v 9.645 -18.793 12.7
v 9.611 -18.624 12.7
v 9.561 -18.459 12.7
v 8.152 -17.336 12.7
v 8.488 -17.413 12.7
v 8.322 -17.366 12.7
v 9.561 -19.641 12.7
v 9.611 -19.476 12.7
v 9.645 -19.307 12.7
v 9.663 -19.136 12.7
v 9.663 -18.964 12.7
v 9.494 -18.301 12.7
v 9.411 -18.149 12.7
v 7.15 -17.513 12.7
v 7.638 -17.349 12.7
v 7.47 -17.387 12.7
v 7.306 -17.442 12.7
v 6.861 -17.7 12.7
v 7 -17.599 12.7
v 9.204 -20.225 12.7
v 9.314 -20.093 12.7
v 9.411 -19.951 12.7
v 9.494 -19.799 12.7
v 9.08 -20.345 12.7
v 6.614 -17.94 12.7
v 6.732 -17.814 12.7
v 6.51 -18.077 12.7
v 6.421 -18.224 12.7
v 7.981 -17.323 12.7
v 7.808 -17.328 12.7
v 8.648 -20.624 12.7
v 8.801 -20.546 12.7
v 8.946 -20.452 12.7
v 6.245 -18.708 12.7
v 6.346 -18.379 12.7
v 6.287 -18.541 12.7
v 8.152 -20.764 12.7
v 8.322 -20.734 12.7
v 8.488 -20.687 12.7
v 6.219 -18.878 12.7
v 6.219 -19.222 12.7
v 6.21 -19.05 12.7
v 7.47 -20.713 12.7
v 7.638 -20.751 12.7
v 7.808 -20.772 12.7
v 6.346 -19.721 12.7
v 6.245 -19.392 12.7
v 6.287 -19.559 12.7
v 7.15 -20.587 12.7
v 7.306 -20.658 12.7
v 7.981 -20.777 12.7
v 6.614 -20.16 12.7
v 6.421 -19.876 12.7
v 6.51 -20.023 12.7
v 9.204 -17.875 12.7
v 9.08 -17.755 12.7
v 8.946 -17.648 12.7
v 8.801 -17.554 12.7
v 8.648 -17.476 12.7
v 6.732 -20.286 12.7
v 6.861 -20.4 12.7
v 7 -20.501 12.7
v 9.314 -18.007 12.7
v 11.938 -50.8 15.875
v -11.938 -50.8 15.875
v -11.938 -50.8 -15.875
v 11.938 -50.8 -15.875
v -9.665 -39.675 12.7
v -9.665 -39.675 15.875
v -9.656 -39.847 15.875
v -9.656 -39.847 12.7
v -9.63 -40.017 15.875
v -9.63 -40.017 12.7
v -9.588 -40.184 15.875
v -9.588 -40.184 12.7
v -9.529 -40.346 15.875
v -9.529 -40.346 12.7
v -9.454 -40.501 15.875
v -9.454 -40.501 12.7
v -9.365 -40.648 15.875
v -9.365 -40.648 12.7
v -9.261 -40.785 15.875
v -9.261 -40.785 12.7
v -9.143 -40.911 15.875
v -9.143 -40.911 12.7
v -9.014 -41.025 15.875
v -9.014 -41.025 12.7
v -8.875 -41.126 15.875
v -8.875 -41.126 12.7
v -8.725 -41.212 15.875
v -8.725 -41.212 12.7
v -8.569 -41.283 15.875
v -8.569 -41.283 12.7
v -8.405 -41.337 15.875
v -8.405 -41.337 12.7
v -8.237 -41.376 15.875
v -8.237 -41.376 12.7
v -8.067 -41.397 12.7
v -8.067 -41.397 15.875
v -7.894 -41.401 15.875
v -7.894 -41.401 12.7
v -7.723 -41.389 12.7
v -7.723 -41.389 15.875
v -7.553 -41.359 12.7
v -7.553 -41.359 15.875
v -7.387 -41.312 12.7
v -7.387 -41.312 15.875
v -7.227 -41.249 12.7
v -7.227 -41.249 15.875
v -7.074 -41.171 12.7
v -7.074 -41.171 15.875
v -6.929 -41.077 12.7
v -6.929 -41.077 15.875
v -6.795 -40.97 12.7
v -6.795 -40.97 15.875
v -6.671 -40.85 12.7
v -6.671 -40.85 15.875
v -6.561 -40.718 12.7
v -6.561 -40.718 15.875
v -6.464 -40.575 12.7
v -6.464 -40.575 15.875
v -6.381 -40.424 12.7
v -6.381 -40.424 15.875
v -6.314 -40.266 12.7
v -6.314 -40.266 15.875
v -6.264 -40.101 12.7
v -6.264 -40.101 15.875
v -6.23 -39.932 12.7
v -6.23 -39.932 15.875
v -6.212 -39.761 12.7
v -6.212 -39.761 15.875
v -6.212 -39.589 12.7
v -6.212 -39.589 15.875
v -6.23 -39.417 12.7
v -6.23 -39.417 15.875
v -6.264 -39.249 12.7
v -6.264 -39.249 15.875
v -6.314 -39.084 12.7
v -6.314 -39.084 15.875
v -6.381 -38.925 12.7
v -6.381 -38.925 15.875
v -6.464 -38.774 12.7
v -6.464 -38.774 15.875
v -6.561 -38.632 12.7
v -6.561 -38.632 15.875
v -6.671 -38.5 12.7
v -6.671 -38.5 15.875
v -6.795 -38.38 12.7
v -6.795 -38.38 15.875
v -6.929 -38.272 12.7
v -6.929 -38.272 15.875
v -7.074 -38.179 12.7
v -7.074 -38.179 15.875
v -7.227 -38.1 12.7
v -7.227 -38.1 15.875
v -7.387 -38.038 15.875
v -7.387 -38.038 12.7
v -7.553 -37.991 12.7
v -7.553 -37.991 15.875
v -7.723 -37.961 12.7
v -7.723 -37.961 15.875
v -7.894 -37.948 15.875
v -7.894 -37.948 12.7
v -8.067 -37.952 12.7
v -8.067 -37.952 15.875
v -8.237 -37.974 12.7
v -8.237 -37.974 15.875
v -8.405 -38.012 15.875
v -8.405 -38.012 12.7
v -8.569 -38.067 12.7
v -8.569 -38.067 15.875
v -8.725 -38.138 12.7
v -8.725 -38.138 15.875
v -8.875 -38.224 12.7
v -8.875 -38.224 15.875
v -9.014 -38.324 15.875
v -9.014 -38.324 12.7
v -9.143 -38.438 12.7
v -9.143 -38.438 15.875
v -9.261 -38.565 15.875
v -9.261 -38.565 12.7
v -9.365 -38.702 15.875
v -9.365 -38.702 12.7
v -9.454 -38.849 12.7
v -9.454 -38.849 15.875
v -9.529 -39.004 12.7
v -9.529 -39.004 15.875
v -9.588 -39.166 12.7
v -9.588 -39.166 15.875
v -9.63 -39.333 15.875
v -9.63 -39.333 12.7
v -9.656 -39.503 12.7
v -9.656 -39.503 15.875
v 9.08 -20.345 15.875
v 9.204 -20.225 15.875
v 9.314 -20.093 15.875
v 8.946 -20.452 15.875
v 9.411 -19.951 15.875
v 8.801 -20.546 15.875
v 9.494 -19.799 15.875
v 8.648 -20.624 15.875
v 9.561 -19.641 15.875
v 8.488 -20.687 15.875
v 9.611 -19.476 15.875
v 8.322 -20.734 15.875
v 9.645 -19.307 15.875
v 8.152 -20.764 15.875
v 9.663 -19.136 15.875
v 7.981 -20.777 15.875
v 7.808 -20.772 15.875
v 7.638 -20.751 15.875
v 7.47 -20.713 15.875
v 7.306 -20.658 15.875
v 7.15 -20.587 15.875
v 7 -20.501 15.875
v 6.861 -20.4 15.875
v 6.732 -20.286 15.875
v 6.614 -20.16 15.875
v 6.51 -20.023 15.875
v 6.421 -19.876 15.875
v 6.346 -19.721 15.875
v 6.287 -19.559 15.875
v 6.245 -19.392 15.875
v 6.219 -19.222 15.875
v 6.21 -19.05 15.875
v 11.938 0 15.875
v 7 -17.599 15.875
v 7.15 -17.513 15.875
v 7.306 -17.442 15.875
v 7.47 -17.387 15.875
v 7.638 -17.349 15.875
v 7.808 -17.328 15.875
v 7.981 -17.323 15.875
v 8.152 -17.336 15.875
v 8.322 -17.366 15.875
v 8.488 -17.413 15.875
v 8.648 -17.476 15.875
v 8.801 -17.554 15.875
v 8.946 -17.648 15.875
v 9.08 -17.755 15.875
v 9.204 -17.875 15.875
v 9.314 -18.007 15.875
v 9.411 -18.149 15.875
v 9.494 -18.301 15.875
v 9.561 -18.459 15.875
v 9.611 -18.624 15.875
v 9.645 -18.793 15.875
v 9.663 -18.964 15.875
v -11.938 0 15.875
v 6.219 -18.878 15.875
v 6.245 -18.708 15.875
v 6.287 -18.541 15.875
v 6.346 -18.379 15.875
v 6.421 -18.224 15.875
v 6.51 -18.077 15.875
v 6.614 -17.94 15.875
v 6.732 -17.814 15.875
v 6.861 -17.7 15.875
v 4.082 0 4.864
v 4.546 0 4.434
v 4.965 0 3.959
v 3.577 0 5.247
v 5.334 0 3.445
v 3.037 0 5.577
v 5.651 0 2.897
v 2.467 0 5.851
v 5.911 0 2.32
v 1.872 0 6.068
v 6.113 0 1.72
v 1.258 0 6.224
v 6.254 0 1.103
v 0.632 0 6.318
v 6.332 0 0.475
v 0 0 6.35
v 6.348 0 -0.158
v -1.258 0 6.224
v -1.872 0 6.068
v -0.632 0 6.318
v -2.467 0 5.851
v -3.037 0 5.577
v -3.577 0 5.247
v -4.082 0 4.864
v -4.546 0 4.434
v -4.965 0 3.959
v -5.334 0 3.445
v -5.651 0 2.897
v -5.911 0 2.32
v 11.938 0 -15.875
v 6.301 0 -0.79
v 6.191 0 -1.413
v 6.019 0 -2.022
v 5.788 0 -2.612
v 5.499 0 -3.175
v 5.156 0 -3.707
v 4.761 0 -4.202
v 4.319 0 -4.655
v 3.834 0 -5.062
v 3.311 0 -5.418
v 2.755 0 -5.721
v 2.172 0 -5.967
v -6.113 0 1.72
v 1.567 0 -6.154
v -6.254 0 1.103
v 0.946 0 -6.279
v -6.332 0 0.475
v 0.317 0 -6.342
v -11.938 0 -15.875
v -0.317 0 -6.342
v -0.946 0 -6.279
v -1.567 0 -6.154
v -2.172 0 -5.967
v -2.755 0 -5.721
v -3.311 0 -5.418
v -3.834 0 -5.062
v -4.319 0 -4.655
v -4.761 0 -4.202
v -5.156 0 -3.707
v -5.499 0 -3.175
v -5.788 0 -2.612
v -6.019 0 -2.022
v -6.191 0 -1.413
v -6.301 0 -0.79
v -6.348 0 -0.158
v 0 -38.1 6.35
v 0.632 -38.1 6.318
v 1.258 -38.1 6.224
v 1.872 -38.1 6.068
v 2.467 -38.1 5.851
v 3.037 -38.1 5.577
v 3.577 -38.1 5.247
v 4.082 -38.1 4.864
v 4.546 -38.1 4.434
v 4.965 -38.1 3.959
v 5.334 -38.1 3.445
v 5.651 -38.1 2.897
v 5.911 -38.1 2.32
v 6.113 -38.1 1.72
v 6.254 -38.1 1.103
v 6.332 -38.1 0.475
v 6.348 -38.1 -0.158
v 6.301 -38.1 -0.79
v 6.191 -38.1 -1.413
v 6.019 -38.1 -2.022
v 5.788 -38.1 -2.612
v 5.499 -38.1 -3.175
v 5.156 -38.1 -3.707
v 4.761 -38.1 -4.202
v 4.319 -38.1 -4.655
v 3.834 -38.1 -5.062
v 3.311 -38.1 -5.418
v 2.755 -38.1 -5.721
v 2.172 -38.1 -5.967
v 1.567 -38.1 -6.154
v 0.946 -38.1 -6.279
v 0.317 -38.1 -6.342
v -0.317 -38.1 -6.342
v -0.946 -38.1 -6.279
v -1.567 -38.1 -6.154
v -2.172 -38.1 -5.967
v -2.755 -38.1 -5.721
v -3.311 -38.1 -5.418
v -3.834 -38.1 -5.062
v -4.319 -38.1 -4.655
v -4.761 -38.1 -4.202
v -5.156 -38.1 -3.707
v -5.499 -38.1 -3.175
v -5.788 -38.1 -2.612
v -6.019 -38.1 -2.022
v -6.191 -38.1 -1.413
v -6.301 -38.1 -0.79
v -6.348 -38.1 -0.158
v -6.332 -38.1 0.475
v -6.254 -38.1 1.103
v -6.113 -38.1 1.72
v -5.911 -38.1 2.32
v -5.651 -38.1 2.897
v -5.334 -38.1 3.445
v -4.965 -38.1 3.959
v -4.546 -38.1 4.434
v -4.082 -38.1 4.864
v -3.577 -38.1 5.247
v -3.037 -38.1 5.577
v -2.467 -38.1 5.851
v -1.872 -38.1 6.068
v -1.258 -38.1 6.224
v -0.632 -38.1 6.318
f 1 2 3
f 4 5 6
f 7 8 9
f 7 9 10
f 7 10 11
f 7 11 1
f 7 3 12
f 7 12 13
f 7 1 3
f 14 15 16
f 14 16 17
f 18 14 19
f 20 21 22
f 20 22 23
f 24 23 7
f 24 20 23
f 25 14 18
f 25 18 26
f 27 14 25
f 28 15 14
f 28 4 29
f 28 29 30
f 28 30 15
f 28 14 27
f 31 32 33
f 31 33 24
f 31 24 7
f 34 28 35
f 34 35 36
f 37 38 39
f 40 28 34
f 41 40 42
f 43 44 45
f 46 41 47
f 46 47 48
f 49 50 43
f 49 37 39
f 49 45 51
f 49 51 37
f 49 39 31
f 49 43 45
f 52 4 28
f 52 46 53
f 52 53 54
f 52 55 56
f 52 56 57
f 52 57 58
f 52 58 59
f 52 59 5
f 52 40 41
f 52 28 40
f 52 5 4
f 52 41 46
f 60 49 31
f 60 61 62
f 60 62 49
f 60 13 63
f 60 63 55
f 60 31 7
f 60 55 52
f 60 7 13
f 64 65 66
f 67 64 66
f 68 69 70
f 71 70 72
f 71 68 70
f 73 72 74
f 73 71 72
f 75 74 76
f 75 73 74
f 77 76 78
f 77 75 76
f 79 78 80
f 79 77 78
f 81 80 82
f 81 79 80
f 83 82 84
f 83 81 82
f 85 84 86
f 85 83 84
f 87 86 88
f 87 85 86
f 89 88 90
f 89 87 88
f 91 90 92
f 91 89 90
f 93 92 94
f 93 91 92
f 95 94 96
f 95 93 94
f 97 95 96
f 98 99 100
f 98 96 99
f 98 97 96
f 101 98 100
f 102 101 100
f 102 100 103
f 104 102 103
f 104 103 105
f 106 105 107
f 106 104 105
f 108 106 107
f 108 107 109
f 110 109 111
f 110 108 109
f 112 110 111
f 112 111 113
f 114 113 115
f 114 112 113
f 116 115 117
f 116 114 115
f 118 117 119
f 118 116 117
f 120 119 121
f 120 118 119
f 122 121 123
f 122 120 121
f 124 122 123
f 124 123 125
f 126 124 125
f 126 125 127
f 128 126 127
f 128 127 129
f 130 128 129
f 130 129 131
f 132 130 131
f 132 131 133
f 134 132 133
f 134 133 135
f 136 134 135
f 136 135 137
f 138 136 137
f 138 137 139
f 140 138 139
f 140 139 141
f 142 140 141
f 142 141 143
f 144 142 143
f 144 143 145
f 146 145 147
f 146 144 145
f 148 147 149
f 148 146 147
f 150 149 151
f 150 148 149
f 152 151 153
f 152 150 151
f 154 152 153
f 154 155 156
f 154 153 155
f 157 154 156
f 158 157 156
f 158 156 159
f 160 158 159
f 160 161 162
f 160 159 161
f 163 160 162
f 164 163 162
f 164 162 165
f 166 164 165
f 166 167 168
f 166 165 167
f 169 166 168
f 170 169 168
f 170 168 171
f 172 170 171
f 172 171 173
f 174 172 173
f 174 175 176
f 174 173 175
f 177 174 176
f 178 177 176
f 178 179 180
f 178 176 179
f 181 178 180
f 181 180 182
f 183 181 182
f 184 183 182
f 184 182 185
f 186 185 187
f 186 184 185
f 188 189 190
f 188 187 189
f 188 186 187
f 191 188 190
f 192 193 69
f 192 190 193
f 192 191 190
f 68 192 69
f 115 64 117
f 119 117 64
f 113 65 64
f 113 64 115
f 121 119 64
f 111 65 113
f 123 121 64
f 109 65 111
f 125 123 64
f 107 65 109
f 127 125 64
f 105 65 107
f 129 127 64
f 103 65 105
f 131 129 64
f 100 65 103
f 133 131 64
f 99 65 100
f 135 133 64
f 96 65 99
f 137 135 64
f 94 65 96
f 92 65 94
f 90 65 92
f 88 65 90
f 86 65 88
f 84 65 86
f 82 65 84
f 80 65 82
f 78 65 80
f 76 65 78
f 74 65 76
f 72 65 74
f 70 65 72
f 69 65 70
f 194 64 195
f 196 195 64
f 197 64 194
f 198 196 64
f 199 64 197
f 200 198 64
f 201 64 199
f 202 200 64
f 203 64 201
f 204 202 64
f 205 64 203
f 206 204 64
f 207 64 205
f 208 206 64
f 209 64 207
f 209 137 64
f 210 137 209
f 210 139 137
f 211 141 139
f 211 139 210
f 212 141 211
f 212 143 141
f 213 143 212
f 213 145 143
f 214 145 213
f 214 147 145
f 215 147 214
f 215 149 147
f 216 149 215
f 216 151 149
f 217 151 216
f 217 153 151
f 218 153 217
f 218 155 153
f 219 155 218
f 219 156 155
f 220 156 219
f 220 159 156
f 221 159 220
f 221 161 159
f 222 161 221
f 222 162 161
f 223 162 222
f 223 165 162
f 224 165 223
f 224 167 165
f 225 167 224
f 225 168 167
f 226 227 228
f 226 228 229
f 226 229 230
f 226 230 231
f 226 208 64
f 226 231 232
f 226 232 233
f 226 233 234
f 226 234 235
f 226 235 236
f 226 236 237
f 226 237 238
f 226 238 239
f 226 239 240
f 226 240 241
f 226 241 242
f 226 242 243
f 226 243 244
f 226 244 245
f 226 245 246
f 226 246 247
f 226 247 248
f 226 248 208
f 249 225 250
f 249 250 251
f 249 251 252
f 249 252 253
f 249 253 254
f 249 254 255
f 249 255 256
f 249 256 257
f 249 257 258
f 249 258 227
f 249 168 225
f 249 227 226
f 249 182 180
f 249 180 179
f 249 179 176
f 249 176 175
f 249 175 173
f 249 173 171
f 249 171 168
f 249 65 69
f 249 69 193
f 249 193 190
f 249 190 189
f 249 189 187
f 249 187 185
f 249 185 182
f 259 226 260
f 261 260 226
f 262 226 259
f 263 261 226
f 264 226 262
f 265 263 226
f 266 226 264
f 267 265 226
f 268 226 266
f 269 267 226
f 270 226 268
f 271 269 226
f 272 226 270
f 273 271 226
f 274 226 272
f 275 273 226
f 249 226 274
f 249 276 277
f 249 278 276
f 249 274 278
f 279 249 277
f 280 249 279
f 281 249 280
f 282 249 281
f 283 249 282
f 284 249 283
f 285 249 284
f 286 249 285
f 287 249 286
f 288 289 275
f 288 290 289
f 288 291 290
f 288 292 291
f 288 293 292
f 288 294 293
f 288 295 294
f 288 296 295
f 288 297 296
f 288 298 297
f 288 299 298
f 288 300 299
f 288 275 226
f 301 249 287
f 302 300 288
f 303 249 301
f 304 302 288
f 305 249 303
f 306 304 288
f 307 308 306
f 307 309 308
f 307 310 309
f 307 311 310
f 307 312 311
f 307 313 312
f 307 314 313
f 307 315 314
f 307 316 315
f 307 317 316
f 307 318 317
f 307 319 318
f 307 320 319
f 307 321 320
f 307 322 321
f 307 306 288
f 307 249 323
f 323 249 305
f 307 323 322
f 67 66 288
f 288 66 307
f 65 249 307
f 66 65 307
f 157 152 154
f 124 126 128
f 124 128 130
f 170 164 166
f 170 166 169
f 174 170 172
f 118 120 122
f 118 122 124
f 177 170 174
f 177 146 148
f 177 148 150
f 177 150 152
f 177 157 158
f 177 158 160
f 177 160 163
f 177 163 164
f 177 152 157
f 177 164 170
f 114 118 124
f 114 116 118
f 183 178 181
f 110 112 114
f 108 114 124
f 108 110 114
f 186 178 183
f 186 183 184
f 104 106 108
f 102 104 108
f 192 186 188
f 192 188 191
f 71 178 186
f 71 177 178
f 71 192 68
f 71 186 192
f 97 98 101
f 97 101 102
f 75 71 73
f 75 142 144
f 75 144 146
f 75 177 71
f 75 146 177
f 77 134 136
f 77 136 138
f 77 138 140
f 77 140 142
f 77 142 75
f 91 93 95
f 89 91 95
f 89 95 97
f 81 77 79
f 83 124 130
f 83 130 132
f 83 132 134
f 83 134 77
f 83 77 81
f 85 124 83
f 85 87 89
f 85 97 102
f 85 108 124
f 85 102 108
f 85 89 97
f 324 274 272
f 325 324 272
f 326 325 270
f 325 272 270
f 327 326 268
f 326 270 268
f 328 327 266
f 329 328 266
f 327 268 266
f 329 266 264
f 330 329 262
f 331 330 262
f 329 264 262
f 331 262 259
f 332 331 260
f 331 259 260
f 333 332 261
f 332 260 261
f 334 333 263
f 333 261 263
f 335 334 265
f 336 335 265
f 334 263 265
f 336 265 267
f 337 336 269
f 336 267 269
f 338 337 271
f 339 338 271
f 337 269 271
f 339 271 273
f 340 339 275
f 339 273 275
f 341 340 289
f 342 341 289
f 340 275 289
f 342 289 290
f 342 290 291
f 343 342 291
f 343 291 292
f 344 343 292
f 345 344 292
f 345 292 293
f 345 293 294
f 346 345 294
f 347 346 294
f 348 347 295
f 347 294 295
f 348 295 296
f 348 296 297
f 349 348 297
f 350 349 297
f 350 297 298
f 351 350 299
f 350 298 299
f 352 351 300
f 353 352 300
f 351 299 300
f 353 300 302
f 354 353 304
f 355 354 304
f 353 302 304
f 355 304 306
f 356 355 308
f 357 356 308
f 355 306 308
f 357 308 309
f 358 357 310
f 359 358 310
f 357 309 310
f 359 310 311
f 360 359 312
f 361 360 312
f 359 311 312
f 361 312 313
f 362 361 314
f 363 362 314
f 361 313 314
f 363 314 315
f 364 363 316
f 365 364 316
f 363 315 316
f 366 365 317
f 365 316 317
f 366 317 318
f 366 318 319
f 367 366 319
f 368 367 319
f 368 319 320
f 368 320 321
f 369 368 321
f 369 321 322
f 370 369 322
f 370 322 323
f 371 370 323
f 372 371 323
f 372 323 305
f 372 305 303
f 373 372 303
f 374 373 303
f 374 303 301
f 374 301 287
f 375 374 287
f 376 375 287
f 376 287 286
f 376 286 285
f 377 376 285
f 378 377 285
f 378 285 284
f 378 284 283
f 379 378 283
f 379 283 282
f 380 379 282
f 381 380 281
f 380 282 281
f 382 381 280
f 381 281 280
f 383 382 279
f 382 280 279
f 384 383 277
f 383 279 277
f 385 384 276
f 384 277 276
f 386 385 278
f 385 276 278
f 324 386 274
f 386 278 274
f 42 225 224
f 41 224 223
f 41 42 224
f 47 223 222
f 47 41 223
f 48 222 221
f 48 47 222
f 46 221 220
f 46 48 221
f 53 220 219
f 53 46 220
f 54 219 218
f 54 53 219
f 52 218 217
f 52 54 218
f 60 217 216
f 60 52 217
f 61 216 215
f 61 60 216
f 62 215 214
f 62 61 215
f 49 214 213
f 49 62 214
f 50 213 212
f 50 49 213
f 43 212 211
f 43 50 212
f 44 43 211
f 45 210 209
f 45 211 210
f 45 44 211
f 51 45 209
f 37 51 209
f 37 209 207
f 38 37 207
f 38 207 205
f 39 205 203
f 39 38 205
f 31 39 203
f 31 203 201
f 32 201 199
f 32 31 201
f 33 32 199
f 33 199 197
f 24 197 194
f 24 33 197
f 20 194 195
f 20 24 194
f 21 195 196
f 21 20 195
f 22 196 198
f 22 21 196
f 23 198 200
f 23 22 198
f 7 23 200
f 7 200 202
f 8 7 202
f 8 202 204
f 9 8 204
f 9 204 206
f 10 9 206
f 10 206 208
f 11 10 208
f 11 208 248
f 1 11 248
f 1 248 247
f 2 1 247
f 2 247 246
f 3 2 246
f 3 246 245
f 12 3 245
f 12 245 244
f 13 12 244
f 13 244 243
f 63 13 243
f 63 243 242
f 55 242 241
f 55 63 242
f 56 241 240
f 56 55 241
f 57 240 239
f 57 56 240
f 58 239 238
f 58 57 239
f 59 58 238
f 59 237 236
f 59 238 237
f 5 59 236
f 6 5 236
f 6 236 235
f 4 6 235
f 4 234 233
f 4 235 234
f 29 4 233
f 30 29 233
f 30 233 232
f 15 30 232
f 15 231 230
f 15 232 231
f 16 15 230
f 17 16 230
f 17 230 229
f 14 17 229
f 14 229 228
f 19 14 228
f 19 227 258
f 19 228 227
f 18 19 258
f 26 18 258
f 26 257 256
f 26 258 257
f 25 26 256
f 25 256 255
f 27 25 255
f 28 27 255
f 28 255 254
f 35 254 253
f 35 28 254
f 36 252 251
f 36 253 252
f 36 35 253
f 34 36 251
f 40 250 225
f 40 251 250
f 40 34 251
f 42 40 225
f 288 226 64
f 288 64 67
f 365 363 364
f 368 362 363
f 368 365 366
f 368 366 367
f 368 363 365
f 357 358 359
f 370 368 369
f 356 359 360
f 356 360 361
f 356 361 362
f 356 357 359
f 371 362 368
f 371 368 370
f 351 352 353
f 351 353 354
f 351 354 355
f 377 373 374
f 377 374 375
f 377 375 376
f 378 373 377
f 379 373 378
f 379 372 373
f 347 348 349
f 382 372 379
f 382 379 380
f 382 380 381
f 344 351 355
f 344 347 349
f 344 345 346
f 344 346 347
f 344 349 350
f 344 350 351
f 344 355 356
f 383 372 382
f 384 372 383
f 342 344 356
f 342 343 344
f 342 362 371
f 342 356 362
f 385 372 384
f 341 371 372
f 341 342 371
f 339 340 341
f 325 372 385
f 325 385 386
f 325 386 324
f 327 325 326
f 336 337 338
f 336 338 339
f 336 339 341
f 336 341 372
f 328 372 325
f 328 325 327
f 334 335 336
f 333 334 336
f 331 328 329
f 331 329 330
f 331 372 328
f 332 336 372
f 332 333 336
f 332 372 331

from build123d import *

# Parameters (mm, degrees)
BOSS_EXTRUDE1_DEPTH      = 11.938
BOSS_EXTRUDE1_DEPTH_BACK = 11.938
SKETCH1_W                = 31.75
SKETCH1_H                = 50.8
CUT_EXTRUDE2_DEPTH       = 62.083699495
CUT_EXTRUDE2_DEPTH_BACK  = 3.175
SKETCH3_R                = 1.7272
SKETCH4_R                = 6.35
CUT_EXTRUDE3_DEPTH       = 38.1


with BuildPart() as part:
    # Sketch1 → Boss-Extrude1 (new, two sides: drawn at the far end of the back side and taken through both)
    with BuildSketch(Plane(origin=(0, 0, 0), x_dir=(0, 0, -1), z_dir=(1, 0, 0)).offset(-BOSS_EXTRUDE1_DEPTH_BACK)):
        with Locations((0, -25.4)):
            Rectangle(SKETCH1_W, SKETCH1_H)
    extrude(amount=BOSS_EXTRUDE1_DEPTH + BOSS_EXTRUDE1_DEPTH_BACK)

    # Sketch3 → Cut-Extrude2 (cut, two sides: drawn at the far end of the back side and taken through both)
    with BuildSketch(Plane.XY.offset(15.875).offset(-CUT_EXTRUDE2_DEPTH_BACK)):
        with Locations(Location((7.9375, -19.05, 0), (0, 0, 180))):
            Circle(SKETCH3_R)
        with Locations(Location((-7.9375, -39.6748, 0), (0, 0, 180))):
            Circle(SKETCH3_R)
    extrude(amount=CUT_EXTRUDE2_DEPTH + CUT_EXTRUDE2_DEPTH_BACK, mode=Mode.SUBTRACT)

    # Sketch4 → Cut-Extrude3 (cut)
    with BuildSketch(Plane(origin=(0, 0, 0), x_dir=(1, 0, 0), z_dir=(0, 1, 0))):
        with Locations(Location((0, 0, 0), (0, 0, 270))):
            Circle(SKETCH4_R)
    extrude(amount=-CUT_EXTRUDE3_DEPTH, mode=Mode.SUBTRACT)


solid = part.part
